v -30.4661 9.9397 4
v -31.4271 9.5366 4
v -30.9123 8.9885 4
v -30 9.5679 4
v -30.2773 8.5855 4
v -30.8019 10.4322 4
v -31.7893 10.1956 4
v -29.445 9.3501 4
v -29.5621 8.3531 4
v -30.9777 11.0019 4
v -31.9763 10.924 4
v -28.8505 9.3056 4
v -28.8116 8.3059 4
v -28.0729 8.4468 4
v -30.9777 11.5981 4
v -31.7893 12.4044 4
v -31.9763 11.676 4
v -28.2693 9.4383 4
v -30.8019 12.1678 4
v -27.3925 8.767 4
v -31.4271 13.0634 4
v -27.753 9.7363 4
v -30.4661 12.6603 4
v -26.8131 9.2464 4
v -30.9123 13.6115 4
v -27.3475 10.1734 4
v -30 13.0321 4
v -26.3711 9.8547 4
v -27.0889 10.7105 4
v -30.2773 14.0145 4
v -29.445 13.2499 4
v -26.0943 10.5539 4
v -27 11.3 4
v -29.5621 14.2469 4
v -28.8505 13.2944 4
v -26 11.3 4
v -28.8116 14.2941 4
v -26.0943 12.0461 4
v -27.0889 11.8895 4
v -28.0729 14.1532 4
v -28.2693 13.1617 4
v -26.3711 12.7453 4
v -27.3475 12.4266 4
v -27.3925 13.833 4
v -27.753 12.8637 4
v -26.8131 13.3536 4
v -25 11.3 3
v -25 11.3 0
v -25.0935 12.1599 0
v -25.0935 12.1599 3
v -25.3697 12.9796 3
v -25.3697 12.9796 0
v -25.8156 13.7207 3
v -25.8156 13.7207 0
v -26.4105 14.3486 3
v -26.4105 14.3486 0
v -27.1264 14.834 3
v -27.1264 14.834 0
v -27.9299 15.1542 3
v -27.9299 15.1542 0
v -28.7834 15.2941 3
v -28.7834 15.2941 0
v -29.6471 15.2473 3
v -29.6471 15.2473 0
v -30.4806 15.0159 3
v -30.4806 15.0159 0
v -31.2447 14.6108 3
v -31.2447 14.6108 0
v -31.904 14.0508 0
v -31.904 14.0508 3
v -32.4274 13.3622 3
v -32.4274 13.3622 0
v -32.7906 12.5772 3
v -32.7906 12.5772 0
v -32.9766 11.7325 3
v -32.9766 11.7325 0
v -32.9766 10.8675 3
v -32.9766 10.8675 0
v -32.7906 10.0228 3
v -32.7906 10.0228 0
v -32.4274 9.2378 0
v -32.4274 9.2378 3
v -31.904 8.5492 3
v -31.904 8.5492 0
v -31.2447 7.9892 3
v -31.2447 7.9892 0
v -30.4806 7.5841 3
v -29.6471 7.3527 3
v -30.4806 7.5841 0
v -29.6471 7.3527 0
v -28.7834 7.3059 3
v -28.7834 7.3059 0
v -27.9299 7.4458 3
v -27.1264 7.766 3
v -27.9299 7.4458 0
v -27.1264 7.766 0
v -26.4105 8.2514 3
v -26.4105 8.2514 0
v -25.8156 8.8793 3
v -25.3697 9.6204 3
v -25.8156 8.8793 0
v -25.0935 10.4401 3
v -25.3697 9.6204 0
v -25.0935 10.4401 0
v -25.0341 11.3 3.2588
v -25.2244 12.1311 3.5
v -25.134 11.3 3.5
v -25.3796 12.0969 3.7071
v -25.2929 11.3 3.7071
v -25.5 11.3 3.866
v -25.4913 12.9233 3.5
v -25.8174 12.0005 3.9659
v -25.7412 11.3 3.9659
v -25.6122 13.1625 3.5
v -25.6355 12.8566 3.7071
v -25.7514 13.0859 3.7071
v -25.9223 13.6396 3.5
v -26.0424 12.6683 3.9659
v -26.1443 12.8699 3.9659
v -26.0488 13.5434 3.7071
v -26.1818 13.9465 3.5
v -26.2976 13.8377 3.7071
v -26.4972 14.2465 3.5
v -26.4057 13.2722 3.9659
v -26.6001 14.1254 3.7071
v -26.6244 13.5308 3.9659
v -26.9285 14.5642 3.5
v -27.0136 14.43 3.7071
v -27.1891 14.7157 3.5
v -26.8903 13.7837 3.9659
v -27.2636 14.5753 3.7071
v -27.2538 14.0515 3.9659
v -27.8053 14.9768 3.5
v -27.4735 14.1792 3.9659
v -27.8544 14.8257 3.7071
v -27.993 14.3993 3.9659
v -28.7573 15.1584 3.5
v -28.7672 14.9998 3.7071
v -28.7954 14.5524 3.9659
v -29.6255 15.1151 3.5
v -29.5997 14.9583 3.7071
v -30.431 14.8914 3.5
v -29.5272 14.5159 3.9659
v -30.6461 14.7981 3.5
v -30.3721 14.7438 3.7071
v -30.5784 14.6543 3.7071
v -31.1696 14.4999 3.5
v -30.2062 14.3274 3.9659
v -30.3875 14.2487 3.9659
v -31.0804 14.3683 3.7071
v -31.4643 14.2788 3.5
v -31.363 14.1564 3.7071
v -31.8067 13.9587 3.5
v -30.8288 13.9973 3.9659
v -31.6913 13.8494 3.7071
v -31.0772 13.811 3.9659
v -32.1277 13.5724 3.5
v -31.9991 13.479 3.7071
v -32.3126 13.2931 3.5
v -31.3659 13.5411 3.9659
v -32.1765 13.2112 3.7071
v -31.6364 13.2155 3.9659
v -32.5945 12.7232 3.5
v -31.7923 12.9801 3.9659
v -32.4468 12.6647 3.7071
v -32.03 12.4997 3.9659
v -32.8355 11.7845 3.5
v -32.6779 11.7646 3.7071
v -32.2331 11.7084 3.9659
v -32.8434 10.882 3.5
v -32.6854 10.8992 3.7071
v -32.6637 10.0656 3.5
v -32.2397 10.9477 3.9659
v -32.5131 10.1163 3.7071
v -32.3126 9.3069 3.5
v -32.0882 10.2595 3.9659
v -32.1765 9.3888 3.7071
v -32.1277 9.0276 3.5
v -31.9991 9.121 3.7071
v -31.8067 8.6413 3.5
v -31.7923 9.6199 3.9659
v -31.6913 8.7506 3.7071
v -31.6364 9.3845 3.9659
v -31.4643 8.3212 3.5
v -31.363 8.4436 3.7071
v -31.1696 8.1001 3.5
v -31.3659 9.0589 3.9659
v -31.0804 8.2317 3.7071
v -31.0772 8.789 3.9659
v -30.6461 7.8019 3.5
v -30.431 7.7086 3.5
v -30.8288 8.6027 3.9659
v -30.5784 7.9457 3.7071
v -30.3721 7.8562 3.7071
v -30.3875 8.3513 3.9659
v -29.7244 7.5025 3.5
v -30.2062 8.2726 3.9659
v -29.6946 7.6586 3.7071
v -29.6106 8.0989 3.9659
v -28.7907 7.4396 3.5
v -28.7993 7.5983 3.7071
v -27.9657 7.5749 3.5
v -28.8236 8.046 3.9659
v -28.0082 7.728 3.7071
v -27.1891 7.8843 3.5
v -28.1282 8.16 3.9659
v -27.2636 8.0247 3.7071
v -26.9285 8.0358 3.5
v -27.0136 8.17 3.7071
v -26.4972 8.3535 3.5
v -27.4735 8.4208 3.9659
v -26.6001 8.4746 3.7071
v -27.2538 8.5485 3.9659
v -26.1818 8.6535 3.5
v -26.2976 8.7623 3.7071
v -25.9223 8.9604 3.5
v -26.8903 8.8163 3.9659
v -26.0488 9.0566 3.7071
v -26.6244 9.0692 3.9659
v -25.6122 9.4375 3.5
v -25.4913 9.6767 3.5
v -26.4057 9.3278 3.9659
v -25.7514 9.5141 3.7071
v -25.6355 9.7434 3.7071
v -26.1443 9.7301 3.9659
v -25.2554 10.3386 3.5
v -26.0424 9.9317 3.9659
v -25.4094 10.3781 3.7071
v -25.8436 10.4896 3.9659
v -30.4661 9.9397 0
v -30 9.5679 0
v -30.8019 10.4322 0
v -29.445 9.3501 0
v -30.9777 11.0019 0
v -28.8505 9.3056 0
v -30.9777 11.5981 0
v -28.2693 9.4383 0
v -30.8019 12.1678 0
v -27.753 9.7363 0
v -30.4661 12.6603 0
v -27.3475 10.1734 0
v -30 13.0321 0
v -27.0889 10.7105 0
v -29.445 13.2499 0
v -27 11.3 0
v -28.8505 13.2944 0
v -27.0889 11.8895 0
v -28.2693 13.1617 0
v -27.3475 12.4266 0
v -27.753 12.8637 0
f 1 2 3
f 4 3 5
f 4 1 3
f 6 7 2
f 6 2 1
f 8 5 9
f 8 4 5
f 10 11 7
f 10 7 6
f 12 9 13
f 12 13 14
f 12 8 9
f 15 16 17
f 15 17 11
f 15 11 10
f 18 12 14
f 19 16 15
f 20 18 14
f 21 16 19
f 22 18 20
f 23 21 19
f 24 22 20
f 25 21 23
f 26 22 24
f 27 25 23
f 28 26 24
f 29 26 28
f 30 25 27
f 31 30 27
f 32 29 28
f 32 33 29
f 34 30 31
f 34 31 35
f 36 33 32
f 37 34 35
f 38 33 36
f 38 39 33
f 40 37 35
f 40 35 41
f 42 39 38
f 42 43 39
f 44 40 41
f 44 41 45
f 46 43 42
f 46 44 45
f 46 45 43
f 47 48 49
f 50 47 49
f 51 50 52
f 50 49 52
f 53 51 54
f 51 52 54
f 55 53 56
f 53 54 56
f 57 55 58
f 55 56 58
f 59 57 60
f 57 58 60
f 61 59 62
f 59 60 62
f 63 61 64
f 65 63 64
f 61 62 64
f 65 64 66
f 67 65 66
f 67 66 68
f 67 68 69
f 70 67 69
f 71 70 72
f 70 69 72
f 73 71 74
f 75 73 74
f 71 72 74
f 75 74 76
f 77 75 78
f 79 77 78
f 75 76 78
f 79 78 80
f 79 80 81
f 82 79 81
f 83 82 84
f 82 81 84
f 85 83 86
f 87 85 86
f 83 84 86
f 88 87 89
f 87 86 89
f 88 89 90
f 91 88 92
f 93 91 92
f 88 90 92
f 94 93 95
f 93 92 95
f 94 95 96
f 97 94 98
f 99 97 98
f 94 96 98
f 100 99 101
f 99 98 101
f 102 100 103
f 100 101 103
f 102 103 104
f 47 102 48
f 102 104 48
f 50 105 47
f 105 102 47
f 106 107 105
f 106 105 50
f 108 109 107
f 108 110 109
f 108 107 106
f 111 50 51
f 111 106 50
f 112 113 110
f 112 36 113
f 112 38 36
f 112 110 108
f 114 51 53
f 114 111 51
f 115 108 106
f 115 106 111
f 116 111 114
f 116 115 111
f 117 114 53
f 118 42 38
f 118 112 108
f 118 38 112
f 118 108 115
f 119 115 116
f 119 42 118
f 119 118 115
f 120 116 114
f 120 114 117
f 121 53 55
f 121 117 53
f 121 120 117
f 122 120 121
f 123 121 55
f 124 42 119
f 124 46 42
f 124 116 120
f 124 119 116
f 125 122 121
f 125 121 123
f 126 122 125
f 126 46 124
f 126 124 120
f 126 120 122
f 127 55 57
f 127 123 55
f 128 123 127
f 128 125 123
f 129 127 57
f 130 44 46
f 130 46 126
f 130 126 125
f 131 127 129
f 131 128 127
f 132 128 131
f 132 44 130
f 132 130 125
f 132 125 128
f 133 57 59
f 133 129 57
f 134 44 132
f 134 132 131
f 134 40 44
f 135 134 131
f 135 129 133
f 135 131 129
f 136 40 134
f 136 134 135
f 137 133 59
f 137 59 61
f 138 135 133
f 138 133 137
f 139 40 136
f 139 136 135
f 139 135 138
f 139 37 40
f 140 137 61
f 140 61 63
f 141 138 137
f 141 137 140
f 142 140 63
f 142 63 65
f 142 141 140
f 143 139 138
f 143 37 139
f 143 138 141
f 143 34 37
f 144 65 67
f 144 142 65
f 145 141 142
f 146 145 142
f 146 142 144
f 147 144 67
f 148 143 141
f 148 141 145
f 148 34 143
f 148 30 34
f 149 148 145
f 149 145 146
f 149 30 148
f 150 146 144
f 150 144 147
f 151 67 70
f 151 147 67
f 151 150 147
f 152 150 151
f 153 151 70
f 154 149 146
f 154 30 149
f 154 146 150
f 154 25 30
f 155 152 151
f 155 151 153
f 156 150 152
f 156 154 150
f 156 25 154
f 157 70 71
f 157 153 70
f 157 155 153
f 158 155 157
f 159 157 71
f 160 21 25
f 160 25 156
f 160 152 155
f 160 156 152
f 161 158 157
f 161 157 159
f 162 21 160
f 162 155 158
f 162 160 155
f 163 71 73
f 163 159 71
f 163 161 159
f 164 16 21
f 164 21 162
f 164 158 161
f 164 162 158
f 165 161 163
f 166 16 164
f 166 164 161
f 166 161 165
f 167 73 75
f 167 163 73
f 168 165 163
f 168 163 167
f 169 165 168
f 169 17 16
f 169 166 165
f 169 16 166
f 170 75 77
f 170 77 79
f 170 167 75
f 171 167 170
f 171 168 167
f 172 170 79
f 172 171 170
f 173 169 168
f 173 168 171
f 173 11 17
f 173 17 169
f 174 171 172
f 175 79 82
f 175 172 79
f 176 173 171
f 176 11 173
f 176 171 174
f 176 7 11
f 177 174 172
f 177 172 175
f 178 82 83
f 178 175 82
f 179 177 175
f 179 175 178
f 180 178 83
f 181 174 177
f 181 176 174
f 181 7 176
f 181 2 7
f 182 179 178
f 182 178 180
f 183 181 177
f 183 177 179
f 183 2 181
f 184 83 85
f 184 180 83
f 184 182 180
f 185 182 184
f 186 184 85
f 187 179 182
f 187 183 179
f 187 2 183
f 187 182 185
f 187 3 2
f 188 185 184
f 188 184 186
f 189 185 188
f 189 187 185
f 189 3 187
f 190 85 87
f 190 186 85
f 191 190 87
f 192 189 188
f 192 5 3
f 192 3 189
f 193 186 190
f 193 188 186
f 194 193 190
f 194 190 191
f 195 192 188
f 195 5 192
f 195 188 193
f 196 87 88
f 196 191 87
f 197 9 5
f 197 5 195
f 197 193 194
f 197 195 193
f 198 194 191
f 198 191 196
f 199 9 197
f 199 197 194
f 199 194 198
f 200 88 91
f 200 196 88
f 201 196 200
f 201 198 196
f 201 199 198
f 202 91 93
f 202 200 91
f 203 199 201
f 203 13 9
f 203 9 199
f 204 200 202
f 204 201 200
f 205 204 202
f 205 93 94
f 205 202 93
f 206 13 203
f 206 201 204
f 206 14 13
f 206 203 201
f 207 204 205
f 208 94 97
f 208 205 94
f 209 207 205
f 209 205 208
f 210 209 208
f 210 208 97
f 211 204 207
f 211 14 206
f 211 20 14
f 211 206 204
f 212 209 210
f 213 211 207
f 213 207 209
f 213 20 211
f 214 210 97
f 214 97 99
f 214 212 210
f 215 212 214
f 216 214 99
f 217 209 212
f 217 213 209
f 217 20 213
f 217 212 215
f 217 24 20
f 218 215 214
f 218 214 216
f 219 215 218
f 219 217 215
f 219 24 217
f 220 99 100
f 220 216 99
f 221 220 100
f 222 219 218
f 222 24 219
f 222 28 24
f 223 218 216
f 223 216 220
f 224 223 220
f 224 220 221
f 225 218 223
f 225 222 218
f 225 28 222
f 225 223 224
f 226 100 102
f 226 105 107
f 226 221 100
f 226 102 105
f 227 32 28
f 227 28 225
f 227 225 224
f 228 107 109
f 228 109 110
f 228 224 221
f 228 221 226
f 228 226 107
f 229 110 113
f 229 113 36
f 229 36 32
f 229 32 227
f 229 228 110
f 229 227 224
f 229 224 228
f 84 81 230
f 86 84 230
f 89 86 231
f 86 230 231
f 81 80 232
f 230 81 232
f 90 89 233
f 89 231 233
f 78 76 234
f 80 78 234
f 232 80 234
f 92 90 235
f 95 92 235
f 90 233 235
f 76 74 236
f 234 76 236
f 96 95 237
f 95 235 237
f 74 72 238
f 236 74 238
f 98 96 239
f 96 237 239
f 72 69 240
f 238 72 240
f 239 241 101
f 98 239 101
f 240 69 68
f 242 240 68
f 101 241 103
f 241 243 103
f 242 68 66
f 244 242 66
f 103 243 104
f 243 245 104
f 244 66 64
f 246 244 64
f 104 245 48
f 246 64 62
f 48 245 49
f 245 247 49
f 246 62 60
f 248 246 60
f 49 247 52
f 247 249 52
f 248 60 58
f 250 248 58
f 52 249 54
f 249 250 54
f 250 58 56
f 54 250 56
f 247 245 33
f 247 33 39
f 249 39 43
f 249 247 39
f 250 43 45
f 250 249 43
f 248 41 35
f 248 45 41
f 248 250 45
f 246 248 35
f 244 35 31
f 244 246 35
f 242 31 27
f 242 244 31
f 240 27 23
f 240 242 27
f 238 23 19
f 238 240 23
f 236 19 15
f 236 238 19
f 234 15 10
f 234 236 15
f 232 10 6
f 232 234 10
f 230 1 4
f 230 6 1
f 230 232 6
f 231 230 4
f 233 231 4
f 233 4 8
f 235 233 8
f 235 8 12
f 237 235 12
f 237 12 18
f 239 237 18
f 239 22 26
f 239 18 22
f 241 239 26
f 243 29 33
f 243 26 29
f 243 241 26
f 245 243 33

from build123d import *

# Parameters (mm, degrees)
CYLINDER001_R     = 2
CYLINDER001_DEPTH = 10
CYLINDER_R        = 4
CYLINDER_DEPTH    = 4
FILLET_R          = 1


with BuildPart() as cilindro001:
    # Cylinder001 → Cylinder001 (new body)
    with BuildSketch(Plane(origin=(-35, 16, -2), x_dir=(1, 0, 0), z_dir=(0, 0, 1))):
        Circle(CYLINDER001_R)
    extrude(amount=CYLINDER001_DEPTH)


with BuildPart() as aro:
    # Cylinder → Cylinder (new body)
    with BuildSketch(Plane(origin=(-35, 16, 0), x_dir=(1, 0, 0), z_dir=(0, 0, 1))):
        Circle(CYLINDER_R)
    extrude(amount=CYLINDER_DEPTH)

    # Cut001: cut Cilindro001
    add(cilindro001.part, mode=Mode.SUBTRACT)


with BuildPart() as aro_1:
    # Cut001 placement: moved
    add(aro.part.moved(Location((0, 1.3, 0))))

    # Fillet
    fillet_edges = [aro_1.edges().sort_by_distance(p)[0] for p in [
        (-39, 17.3, 4),
    ]]
    fillet(fillet_edges, radius=FILLET_R)


with BuildPart() as aro_2:
    # Fillet placement: moved
    add(aro_1.part.moved(Location((6, -6, 0))))


solid = aro_2.part
